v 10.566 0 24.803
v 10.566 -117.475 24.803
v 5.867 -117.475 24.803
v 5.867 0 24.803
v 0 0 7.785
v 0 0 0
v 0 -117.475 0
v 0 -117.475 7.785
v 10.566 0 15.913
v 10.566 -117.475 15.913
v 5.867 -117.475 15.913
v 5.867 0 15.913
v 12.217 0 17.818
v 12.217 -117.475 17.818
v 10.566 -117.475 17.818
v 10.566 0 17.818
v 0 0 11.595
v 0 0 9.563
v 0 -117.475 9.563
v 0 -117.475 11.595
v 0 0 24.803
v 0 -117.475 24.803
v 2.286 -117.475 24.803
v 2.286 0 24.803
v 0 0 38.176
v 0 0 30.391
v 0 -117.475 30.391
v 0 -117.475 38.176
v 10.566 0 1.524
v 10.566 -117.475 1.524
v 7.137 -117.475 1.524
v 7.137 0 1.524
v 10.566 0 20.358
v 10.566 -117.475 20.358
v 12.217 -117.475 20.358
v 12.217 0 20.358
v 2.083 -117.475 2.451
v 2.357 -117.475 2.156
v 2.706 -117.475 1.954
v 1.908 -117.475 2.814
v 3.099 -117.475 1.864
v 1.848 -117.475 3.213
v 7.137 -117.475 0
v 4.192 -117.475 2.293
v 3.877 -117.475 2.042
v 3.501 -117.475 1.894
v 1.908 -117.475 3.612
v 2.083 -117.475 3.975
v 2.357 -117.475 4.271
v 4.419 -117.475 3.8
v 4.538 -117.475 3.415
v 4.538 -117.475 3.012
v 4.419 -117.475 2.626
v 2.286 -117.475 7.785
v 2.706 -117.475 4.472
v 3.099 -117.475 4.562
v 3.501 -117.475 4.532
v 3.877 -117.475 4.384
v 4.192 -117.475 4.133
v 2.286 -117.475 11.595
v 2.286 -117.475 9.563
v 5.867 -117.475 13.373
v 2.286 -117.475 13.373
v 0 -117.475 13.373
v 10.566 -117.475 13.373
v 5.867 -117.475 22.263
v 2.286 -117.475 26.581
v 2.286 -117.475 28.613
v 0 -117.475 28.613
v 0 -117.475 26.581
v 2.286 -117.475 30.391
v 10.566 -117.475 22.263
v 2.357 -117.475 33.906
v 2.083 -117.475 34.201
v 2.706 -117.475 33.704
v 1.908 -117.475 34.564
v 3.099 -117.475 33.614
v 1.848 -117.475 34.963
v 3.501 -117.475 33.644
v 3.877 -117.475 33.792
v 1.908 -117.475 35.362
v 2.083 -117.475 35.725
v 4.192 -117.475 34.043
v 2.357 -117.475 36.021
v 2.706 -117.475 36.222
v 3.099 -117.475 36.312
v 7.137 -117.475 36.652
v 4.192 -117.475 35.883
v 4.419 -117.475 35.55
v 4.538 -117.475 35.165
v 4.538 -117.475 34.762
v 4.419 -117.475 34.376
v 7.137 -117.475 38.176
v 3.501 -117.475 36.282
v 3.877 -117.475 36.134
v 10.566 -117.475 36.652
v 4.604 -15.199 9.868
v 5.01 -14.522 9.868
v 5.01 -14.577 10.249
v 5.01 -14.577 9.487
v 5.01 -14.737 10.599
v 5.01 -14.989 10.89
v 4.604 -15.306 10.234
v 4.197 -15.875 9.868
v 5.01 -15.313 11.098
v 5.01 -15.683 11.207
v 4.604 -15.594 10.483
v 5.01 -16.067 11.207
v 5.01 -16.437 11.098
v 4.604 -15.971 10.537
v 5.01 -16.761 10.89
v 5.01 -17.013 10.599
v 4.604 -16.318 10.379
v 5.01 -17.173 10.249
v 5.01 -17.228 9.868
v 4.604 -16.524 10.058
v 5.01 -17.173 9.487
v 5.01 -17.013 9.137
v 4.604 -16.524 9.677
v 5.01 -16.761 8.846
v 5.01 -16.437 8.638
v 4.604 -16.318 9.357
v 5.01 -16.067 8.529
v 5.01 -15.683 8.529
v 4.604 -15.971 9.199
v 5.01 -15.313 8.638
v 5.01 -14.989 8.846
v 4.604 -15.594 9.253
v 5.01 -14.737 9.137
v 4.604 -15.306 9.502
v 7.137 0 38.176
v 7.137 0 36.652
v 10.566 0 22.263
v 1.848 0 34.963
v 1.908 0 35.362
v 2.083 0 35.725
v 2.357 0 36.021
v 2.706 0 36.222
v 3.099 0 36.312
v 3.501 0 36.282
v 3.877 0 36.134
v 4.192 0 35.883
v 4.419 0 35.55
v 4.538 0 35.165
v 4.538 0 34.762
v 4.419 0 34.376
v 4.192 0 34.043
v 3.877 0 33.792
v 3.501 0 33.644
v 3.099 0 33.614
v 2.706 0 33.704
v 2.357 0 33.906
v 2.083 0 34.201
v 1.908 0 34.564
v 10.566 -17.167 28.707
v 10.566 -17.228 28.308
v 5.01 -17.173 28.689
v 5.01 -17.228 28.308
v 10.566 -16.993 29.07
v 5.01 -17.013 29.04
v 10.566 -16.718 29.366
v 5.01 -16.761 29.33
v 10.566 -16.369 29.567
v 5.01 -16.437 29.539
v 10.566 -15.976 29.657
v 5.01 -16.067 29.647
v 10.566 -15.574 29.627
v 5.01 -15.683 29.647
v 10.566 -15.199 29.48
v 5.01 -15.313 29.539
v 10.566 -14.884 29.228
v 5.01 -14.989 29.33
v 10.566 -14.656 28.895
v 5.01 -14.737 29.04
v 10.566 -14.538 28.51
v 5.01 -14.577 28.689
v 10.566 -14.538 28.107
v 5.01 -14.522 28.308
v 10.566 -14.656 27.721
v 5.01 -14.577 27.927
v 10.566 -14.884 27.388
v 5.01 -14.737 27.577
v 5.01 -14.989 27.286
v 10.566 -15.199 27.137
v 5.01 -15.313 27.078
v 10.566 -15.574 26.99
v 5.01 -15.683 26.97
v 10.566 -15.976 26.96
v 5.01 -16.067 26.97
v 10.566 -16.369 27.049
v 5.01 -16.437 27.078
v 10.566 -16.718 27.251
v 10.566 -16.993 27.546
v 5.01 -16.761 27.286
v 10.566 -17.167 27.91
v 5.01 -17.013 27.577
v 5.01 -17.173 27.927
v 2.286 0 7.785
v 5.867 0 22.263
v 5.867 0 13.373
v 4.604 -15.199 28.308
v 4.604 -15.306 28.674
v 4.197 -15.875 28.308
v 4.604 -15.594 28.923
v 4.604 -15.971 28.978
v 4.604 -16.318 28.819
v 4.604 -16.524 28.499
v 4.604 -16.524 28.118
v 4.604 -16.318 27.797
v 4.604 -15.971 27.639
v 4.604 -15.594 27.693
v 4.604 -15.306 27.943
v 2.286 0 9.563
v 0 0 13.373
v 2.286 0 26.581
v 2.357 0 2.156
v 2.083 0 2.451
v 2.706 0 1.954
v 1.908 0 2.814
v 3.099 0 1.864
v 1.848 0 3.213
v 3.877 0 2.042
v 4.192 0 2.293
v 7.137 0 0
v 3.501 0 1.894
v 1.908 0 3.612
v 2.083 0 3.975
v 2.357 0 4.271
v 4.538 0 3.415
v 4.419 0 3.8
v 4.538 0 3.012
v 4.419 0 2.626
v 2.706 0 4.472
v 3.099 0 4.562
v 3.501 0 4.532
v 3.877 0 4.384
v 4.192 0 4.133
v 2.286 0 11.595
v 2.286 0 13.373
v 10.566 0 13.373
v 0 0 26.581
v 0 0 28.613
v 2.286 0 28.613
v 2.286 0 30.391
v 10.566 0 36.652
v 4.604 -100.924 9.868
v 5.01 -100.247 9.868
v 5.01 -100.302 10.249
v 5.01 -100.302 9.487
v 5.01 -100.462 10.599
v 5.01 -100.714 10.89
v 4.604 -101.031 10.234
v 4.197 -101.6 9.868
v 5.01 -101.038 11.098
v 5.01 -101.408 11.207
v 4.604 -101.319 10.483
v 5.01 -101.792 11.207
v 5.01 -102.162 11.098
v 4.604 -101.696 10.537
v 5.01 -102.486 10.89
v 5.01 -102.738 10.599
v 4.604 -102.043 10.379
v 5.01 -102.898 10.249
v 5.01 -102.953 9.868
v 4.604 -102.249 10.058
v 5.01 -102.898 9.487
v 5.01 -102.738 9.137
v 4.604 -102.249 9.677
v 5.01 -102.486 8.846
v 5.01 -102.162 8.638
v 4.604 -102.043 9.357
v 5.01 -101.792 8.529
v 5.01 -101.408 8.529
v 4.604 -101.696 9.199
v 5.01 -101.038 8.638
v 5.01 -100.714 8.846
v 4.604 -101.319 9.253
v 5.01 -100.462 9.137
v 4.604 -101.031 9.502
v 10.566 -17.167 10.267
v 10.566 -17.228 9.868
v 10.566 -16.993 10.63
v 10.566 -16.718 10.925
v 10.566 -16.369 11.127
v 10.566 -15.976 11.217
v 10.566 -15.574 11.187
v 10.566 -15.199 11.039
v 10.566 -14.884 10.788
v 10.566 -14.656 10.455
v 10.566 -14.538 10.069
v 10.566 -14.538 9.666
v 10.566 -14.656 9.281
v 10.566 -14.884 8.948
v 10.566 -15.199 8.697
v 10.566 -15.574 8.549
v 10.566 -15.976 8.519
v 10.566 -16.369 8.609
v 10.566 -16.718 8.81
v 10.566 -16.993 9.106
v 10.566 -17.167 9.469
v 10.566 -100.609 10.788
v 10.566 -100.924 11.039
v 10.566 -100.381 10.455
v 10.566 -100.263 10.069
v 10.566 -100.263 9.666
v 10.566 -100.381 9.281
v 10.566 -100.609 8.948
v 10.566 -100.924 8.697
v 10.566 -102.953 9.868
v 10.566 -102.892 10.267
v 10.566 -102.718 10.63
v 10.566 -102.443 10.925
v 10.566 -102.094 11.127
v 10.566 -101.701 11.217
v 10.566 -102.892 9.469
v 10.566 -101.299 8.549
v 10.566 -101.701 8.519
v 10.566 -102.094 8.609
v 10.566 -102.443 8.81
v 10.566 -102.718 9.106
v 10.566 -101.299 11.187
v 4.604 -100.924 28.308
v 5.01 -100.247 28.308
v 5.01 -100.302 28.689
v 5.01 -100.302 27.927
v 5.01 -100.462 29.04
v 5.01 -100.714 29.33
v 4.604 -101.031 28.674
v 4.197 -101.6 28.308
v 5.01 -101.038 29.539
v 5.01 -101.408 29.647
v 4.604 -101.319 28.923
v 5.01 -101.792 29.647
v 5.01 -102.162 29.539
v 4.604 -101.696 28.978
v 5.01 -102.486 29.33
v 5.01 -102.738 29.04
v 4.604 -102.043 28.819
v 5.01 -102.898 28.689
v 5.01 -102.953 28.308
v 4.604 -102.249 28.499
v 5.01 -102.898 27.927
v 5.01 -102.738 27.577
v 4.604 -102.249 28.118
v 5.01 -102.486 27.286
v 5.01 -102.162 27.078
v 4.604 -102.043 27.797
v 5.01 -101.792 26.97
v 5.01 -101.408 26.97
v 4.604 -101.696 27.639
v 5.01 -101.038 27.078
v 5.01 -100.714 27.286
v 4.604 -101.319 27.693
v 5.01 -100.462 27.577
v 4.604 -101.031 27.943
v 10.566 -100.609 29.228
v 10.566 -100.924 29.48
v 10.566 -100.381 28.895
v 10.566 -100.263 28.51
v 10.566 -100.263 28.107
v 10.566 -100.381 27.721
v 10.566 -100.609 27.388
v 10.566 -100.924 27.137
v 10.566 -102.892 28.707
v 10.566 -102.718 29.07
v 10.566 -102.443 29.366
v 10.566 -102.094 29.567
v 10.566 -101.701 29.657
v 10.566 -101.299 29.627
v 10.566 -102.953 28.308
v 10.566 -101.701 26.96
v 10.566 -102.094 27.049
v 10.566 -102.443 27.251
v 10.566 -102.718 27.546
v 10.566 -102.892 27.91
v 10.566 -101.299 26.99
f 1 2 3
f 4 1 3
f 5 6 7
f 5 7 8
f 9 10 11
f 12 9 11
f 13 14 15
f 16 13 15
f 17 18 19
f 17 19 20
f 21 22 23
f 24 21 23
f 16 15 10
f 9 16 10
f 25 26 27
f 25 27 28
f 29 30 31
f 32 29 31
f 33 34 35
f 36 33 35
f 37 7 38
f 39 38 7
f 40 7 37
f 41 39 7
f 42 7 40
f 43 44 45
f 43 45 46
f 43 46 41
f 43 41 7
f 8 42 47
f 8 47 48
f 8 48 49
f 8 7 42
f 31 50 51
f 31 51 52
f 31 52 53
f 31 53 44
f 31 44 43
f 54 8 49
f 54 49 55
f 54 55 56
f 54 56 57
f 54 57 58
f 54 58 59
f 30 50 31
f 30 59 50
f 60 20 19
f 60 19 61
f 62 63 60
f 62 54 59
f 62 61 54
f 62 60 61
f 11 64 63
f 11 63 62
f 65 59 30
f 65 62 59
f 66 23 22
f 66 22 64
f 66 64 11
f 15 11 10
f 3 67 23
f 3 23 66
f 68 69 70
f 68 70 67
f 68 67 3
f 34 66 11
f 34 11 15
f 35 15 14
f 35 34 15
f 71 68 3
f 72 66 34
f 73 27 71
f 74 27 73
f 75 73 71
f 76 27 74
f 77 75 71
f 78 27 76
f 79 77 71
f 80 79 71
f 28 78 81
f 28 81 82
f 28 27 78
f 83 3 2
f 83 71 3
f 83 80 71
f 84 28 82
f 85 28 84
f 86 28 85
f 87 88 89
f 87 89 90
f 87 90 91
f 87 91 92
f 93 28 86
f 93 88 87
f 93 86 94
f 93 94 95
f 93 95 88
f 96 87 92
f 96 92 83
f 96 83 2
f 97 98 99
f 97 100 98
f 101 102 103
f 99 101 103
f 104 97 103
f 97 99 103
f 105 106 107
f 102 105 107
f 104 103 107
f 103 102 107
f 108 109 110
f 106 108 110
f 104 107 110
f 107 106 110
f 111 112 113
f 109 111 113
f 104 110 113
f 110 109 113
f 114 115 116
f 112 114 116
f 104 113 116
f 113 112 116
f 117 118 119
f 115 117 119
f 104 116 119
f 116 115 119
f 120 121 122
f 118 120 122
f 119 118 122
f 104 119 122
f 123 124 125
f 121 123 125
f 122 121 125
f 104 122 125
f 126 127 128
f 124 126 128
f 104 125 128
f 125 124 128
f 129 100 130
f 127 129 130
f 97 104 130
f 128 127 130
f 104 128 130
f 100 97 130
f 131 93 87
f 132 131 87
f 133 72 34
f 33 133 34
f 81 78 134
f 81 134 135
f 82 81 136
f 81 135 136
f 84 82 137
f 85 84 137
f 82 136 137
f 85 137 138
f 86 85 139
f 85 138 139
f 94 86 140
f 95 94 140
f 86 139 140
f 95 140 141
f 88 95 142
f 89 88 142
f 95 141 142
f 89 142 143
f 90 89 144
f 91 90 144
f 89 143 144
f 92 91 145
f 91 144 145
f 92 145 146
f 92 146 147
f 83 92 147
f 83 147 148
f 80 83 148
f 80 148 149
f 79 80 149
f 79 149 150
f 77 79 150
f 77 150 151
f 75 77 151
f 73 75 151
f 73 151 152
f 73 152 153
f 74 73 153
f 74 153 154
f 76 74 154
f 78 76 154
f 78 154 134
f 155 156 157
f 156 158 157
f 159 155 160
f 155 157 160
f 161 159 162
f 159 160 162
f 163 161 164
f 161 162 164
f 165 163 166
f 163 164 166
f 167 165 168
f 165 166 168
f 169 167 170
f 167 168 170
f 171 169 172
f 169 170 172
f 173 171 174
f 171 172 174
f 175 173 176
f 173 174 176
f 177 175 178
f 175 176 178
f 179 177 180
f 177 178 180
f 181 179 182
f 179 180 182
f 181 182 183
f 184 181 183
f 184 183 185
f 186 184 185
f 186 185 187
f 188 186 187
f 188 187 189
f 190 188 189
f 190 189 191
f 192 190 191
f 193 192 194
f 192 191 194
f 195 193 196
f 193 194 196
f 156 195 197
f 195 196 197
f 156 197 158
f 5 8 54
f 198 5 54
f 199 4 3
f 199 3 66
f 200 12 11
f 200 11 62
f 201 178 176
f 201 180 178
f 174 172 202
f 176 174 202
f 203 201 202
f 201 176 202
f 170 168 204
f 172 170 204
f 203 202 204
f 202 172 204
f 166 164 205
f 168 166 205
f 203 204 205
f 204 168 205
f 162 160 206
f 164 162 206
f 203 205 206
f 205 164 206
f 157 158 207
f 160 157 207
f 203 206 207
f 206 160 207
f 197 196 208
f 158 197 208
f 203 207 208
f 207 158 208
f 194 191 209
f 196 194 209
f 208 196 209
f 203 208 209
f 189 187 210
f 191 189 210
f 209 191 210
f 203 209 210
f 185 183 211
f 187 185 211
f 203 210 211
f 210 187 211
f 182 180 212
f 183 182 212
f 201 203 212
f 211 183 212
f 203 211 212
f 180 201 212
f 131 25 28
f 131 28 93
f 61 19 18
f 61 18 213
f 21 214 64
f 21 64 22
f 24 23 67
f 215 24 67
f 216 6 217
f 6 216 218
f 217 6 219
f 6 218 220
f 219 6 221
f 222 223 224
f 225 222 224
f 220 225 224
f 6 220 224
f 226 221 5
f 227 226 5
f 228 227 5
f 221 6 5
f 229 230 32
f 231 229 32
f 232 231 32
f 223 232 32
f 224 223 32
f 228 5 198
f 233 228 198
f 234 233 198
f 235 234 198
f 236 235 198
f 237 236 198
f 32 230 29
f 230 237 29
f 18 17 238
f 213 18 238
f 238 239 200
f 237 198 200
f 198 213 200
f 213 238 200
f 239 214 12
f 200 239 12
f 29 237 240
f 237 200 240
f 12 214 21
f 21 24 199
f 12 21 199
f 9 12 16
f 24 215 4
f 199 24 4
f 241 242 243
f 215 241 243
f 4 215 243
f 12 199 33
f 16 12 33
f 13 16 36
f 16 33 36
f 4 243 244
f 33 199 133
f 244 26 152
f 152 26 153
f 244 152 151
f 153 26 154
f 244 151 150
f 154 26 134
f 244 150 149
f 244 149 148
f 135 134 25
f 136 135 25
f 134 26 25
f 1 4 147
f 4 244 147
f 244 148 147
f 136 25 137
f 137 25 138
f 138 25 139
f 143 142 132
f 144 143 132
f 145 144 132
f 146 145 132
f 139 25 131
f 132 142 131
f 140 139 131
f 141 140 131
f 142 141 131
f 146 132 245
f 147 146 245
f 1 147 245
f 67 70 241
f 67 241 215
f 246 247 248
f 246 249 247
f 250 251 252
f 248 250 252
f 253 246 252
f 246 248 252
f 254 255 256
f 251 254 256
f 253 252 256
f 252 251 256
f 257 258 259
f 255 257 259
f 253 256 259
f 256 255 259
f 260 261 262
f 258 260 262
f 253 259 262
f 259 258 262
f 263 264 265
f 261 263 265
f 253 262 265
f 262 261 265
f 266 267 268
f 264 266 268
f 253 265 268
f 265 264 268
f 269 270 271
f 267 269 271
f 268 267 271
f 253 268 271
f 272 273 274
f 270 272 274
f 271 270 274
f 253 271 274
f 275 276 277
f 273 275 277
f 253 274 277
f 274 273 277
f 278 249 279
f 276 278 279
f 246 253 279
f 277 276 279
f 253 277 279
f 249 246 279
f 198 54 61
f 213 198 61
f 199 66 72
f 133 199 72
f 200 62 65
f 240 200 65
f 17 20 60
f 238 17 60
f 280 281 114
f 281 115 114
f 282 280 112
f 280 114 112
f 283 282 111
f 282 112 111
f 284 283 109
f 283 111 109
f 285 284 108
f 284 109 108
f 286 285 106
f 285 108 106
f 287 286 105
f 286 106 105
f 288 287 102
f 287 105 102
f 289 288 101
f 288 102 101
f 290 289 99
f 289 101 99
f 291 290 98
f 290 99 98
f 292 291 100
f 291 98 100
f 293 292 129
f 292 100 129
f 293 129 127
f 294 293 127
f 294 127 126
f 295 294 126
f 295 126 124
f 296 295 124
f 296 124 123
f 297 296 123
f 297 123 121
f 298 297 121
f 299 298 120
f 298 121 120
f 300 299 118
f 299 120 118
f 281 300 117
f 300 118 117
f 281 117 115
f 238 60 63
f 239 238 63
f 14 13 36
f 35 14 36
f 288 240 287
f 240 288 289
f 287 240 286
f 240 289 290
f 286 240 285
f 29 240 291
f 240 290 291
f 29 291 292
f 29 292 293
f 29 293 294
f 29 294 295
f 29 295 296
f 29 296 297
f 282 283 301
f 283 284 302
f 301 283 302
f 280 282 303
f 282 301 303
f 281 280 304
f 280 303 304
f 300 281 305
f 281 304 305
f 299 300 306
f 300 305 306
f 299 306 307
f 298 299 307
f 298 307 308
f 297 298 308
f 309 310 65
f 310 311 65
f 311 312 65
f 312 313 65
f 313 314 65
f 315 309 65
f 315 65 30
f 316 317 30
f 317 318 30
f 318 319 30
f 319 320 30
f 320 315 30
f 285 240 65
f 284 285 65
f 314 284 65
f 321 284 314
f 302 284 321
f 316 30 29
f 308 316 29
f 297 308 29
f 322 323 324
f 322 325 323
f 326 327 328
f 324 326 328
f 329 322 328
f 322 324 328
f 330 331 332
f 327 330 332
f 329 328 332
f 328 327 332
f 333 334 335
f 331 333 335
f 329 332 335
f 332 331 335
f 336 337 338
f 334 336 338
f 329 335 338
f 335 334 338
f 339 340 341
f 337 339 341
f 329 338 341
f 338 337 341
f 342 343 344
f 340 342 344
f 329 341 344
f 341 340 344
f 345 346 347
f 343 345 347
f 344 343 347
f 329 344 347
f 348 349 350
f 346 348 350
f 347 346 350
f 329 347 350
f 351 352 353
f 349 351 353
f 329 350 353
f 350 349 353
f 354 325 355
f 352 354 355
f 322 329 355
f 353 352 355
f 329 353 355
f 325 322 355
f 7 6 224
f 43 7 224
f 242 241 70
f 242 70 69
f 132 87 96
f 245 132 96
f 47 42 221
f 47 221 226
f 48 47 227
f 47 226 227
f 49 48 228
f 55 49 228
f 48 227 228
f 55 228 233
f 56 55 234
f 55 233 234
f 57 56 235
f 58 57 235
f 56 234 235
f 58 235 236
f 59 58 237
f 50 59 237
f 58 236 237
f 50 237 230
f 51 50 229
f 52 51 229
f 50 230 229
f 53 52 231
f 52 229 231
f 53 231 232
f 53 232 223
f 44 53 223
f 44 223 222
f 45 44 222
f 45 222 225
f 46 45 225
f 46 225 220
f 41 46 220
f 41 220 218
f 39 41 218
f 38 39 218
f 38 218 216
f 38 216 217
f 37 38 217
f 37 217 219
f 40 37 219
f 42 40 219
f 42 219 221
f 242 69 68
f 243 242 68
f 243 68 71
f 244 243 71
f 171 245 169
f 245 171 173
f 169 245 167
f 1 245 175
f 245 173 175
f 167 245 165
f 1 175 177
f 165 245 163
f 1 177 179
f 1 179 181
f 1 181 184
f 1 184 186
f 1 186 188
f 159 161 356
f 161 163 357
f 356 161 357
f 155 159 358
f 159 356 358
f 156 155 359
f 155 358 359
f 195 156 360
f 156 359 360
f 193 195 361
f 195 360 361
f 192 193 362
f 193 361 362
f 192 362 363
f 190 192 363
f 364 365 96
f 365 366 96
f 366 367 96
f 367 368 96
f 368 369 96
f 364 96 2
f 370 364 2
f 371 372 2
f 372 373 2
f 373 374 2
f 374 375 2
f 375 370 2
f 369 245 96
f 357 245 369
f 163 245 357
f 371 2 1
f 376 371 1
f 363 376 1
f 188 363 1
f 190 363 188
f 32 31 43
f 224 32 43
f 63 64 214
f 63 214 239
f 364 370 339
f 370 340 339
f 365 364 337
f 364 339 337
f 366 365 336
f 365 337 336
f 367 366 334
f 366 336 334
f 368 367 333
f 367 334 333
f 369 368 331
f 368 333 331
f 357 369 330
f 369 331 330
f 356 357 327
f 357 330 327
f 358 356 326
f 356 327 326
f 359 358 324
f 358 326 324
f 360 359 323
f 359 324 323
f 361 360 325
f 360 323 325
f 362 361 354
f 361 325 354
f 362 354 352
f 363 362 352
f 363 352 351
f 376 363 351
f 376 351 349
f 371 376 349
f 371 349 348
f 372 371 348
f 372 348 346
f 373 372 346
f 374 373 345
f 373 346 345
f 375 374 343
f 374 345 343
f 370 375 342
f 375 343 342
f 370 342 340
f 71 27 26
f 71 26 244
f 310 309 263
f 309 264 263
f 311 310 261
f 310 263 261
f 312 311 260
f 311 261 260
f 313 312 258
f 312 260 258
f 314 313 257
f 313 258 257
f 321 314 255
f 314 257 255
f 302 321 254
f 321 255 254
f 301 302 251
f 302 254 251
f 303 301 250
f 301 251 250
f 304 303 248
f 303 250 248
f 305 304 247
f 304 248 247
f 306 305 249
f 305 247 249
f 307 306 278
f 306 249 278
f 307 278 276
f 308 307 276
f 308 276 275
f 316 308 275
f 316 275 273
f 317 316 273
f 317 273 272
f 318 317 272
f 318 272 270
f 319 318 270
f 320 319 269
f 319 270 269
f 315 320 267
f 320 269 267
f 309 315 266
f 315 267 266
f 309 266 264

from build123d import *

# Parameters (mm, degrees)
F0_W            = 12.2174
F0_H            = 38.1762
F1_DEPTH        = 117.475
F2_W            = 2.286
F2_H            = 1.778
F3_DEPTH        = 117.476
F5_DEPTH        = 117.476
F7_D            = 2.7051
F10_D           = 2.7051
F10_DEPTH       = 5.55625
F10_TIP         = 0.8126940303
F10_ON_F9_D     = 2.7051
F10_ON_F9_DEPTH = 5.55625
F10_ON_F9_TIP   = 0.8126940303


with BuildPart() as f1:
    # F0 (on Front) → F1 (new body)
    with BuildSketch(Plane.XZ):
        with Locations((6.1087, 19.0881)):
            Rectangle(F0_W, F0_H)
    extrude(amount=F1_DEPTH)

    # F2 (on face) → F3 (cut, through all)
    with BuildSketch(Plane.XZ.offset(117.475)):
        with Locations((1.143, 29.5021)):
            Rectangle(F2_W, F2_H)
        with Locations((1.143, 25.6921)):
            Rectangle(F2_W, F2_H)
        with Locations((1.143, 8.6741)):
            Rectangle(F2_W, F2_H)
        with Locations((1.143, 12.4841)):
            Rectangle(F2_W, F2_H)
    extrude(amount=-F3_DEPTH, mode=Mode.SUBTRACT)

    # F4 (on face) → F5 (cut, through all)
    with BuildSketch(Plane.XZ.offset(117.475)):
        Polygon((10.5664, 20.3581), (12.2174, 20.3581), (12.2174, 38.1762), (7.1374, 38.1762), (7.1374, 36.6522), (10.5664, 36.6522), (10.5664, 24.8031), (5.8674, 24.8031), (5.8674, 22.2631), (10.5664, 22.2631), align=None)
        Polygon((10.5664, 13.3731), (10.5664, 1.524), (7.1374, 1.524), (7.1374, 0), (12.2174, 0), (12.2174, 17.8181), (10.5664, 17.8181), (10.5664, 15.9131), (5.8674, 15.9131), (5.8674, 13.3731), align=None)
    extrude(amount=-F5_DEPTH, mode=Mode.SUBTRACT)

    # F7 (through all)
    with Locations(Plane.XZ.offset(117.475)):
        with Locations((3.2004, 34.9631), (3.2004, 3.2131)):
            Hole(F7_D / 2)

    # F10
    with Locations(Plane.YZ.offset(10.5664)):
        with Locations((-101.6, 28.3083), (-15.875, 28.3083)):
            Hole(F10_D / 2, depth=F10_DEPTH)
            with Locations((0, 0, -(F10_DEPTH + F10_TIP / 2))):  # 118° drill point
                Cone(0, F10_D / 2, F10_TIP, mode=Mode.SUBTRACT)

    # F10 on F9
    with Locations(Plane.YZ.offset(10.5664)):
        with Locations((-15.875, 9.8679), (-101.6, 9.8679)):
            Hole(F10_ON_F9_D / 2, depth=F10_ON_F9_DEPTH)
            with Locations((0, 0, -(F10_ON_F9_DEPTH + F10_ON_F9_TIP / 2))):  # 118° drill point
                Cone(0, F10_ON_F9_D / 2, F10_ON_F9_TIP, mode=Mode.SUBTRACT)


solid = f1.part
